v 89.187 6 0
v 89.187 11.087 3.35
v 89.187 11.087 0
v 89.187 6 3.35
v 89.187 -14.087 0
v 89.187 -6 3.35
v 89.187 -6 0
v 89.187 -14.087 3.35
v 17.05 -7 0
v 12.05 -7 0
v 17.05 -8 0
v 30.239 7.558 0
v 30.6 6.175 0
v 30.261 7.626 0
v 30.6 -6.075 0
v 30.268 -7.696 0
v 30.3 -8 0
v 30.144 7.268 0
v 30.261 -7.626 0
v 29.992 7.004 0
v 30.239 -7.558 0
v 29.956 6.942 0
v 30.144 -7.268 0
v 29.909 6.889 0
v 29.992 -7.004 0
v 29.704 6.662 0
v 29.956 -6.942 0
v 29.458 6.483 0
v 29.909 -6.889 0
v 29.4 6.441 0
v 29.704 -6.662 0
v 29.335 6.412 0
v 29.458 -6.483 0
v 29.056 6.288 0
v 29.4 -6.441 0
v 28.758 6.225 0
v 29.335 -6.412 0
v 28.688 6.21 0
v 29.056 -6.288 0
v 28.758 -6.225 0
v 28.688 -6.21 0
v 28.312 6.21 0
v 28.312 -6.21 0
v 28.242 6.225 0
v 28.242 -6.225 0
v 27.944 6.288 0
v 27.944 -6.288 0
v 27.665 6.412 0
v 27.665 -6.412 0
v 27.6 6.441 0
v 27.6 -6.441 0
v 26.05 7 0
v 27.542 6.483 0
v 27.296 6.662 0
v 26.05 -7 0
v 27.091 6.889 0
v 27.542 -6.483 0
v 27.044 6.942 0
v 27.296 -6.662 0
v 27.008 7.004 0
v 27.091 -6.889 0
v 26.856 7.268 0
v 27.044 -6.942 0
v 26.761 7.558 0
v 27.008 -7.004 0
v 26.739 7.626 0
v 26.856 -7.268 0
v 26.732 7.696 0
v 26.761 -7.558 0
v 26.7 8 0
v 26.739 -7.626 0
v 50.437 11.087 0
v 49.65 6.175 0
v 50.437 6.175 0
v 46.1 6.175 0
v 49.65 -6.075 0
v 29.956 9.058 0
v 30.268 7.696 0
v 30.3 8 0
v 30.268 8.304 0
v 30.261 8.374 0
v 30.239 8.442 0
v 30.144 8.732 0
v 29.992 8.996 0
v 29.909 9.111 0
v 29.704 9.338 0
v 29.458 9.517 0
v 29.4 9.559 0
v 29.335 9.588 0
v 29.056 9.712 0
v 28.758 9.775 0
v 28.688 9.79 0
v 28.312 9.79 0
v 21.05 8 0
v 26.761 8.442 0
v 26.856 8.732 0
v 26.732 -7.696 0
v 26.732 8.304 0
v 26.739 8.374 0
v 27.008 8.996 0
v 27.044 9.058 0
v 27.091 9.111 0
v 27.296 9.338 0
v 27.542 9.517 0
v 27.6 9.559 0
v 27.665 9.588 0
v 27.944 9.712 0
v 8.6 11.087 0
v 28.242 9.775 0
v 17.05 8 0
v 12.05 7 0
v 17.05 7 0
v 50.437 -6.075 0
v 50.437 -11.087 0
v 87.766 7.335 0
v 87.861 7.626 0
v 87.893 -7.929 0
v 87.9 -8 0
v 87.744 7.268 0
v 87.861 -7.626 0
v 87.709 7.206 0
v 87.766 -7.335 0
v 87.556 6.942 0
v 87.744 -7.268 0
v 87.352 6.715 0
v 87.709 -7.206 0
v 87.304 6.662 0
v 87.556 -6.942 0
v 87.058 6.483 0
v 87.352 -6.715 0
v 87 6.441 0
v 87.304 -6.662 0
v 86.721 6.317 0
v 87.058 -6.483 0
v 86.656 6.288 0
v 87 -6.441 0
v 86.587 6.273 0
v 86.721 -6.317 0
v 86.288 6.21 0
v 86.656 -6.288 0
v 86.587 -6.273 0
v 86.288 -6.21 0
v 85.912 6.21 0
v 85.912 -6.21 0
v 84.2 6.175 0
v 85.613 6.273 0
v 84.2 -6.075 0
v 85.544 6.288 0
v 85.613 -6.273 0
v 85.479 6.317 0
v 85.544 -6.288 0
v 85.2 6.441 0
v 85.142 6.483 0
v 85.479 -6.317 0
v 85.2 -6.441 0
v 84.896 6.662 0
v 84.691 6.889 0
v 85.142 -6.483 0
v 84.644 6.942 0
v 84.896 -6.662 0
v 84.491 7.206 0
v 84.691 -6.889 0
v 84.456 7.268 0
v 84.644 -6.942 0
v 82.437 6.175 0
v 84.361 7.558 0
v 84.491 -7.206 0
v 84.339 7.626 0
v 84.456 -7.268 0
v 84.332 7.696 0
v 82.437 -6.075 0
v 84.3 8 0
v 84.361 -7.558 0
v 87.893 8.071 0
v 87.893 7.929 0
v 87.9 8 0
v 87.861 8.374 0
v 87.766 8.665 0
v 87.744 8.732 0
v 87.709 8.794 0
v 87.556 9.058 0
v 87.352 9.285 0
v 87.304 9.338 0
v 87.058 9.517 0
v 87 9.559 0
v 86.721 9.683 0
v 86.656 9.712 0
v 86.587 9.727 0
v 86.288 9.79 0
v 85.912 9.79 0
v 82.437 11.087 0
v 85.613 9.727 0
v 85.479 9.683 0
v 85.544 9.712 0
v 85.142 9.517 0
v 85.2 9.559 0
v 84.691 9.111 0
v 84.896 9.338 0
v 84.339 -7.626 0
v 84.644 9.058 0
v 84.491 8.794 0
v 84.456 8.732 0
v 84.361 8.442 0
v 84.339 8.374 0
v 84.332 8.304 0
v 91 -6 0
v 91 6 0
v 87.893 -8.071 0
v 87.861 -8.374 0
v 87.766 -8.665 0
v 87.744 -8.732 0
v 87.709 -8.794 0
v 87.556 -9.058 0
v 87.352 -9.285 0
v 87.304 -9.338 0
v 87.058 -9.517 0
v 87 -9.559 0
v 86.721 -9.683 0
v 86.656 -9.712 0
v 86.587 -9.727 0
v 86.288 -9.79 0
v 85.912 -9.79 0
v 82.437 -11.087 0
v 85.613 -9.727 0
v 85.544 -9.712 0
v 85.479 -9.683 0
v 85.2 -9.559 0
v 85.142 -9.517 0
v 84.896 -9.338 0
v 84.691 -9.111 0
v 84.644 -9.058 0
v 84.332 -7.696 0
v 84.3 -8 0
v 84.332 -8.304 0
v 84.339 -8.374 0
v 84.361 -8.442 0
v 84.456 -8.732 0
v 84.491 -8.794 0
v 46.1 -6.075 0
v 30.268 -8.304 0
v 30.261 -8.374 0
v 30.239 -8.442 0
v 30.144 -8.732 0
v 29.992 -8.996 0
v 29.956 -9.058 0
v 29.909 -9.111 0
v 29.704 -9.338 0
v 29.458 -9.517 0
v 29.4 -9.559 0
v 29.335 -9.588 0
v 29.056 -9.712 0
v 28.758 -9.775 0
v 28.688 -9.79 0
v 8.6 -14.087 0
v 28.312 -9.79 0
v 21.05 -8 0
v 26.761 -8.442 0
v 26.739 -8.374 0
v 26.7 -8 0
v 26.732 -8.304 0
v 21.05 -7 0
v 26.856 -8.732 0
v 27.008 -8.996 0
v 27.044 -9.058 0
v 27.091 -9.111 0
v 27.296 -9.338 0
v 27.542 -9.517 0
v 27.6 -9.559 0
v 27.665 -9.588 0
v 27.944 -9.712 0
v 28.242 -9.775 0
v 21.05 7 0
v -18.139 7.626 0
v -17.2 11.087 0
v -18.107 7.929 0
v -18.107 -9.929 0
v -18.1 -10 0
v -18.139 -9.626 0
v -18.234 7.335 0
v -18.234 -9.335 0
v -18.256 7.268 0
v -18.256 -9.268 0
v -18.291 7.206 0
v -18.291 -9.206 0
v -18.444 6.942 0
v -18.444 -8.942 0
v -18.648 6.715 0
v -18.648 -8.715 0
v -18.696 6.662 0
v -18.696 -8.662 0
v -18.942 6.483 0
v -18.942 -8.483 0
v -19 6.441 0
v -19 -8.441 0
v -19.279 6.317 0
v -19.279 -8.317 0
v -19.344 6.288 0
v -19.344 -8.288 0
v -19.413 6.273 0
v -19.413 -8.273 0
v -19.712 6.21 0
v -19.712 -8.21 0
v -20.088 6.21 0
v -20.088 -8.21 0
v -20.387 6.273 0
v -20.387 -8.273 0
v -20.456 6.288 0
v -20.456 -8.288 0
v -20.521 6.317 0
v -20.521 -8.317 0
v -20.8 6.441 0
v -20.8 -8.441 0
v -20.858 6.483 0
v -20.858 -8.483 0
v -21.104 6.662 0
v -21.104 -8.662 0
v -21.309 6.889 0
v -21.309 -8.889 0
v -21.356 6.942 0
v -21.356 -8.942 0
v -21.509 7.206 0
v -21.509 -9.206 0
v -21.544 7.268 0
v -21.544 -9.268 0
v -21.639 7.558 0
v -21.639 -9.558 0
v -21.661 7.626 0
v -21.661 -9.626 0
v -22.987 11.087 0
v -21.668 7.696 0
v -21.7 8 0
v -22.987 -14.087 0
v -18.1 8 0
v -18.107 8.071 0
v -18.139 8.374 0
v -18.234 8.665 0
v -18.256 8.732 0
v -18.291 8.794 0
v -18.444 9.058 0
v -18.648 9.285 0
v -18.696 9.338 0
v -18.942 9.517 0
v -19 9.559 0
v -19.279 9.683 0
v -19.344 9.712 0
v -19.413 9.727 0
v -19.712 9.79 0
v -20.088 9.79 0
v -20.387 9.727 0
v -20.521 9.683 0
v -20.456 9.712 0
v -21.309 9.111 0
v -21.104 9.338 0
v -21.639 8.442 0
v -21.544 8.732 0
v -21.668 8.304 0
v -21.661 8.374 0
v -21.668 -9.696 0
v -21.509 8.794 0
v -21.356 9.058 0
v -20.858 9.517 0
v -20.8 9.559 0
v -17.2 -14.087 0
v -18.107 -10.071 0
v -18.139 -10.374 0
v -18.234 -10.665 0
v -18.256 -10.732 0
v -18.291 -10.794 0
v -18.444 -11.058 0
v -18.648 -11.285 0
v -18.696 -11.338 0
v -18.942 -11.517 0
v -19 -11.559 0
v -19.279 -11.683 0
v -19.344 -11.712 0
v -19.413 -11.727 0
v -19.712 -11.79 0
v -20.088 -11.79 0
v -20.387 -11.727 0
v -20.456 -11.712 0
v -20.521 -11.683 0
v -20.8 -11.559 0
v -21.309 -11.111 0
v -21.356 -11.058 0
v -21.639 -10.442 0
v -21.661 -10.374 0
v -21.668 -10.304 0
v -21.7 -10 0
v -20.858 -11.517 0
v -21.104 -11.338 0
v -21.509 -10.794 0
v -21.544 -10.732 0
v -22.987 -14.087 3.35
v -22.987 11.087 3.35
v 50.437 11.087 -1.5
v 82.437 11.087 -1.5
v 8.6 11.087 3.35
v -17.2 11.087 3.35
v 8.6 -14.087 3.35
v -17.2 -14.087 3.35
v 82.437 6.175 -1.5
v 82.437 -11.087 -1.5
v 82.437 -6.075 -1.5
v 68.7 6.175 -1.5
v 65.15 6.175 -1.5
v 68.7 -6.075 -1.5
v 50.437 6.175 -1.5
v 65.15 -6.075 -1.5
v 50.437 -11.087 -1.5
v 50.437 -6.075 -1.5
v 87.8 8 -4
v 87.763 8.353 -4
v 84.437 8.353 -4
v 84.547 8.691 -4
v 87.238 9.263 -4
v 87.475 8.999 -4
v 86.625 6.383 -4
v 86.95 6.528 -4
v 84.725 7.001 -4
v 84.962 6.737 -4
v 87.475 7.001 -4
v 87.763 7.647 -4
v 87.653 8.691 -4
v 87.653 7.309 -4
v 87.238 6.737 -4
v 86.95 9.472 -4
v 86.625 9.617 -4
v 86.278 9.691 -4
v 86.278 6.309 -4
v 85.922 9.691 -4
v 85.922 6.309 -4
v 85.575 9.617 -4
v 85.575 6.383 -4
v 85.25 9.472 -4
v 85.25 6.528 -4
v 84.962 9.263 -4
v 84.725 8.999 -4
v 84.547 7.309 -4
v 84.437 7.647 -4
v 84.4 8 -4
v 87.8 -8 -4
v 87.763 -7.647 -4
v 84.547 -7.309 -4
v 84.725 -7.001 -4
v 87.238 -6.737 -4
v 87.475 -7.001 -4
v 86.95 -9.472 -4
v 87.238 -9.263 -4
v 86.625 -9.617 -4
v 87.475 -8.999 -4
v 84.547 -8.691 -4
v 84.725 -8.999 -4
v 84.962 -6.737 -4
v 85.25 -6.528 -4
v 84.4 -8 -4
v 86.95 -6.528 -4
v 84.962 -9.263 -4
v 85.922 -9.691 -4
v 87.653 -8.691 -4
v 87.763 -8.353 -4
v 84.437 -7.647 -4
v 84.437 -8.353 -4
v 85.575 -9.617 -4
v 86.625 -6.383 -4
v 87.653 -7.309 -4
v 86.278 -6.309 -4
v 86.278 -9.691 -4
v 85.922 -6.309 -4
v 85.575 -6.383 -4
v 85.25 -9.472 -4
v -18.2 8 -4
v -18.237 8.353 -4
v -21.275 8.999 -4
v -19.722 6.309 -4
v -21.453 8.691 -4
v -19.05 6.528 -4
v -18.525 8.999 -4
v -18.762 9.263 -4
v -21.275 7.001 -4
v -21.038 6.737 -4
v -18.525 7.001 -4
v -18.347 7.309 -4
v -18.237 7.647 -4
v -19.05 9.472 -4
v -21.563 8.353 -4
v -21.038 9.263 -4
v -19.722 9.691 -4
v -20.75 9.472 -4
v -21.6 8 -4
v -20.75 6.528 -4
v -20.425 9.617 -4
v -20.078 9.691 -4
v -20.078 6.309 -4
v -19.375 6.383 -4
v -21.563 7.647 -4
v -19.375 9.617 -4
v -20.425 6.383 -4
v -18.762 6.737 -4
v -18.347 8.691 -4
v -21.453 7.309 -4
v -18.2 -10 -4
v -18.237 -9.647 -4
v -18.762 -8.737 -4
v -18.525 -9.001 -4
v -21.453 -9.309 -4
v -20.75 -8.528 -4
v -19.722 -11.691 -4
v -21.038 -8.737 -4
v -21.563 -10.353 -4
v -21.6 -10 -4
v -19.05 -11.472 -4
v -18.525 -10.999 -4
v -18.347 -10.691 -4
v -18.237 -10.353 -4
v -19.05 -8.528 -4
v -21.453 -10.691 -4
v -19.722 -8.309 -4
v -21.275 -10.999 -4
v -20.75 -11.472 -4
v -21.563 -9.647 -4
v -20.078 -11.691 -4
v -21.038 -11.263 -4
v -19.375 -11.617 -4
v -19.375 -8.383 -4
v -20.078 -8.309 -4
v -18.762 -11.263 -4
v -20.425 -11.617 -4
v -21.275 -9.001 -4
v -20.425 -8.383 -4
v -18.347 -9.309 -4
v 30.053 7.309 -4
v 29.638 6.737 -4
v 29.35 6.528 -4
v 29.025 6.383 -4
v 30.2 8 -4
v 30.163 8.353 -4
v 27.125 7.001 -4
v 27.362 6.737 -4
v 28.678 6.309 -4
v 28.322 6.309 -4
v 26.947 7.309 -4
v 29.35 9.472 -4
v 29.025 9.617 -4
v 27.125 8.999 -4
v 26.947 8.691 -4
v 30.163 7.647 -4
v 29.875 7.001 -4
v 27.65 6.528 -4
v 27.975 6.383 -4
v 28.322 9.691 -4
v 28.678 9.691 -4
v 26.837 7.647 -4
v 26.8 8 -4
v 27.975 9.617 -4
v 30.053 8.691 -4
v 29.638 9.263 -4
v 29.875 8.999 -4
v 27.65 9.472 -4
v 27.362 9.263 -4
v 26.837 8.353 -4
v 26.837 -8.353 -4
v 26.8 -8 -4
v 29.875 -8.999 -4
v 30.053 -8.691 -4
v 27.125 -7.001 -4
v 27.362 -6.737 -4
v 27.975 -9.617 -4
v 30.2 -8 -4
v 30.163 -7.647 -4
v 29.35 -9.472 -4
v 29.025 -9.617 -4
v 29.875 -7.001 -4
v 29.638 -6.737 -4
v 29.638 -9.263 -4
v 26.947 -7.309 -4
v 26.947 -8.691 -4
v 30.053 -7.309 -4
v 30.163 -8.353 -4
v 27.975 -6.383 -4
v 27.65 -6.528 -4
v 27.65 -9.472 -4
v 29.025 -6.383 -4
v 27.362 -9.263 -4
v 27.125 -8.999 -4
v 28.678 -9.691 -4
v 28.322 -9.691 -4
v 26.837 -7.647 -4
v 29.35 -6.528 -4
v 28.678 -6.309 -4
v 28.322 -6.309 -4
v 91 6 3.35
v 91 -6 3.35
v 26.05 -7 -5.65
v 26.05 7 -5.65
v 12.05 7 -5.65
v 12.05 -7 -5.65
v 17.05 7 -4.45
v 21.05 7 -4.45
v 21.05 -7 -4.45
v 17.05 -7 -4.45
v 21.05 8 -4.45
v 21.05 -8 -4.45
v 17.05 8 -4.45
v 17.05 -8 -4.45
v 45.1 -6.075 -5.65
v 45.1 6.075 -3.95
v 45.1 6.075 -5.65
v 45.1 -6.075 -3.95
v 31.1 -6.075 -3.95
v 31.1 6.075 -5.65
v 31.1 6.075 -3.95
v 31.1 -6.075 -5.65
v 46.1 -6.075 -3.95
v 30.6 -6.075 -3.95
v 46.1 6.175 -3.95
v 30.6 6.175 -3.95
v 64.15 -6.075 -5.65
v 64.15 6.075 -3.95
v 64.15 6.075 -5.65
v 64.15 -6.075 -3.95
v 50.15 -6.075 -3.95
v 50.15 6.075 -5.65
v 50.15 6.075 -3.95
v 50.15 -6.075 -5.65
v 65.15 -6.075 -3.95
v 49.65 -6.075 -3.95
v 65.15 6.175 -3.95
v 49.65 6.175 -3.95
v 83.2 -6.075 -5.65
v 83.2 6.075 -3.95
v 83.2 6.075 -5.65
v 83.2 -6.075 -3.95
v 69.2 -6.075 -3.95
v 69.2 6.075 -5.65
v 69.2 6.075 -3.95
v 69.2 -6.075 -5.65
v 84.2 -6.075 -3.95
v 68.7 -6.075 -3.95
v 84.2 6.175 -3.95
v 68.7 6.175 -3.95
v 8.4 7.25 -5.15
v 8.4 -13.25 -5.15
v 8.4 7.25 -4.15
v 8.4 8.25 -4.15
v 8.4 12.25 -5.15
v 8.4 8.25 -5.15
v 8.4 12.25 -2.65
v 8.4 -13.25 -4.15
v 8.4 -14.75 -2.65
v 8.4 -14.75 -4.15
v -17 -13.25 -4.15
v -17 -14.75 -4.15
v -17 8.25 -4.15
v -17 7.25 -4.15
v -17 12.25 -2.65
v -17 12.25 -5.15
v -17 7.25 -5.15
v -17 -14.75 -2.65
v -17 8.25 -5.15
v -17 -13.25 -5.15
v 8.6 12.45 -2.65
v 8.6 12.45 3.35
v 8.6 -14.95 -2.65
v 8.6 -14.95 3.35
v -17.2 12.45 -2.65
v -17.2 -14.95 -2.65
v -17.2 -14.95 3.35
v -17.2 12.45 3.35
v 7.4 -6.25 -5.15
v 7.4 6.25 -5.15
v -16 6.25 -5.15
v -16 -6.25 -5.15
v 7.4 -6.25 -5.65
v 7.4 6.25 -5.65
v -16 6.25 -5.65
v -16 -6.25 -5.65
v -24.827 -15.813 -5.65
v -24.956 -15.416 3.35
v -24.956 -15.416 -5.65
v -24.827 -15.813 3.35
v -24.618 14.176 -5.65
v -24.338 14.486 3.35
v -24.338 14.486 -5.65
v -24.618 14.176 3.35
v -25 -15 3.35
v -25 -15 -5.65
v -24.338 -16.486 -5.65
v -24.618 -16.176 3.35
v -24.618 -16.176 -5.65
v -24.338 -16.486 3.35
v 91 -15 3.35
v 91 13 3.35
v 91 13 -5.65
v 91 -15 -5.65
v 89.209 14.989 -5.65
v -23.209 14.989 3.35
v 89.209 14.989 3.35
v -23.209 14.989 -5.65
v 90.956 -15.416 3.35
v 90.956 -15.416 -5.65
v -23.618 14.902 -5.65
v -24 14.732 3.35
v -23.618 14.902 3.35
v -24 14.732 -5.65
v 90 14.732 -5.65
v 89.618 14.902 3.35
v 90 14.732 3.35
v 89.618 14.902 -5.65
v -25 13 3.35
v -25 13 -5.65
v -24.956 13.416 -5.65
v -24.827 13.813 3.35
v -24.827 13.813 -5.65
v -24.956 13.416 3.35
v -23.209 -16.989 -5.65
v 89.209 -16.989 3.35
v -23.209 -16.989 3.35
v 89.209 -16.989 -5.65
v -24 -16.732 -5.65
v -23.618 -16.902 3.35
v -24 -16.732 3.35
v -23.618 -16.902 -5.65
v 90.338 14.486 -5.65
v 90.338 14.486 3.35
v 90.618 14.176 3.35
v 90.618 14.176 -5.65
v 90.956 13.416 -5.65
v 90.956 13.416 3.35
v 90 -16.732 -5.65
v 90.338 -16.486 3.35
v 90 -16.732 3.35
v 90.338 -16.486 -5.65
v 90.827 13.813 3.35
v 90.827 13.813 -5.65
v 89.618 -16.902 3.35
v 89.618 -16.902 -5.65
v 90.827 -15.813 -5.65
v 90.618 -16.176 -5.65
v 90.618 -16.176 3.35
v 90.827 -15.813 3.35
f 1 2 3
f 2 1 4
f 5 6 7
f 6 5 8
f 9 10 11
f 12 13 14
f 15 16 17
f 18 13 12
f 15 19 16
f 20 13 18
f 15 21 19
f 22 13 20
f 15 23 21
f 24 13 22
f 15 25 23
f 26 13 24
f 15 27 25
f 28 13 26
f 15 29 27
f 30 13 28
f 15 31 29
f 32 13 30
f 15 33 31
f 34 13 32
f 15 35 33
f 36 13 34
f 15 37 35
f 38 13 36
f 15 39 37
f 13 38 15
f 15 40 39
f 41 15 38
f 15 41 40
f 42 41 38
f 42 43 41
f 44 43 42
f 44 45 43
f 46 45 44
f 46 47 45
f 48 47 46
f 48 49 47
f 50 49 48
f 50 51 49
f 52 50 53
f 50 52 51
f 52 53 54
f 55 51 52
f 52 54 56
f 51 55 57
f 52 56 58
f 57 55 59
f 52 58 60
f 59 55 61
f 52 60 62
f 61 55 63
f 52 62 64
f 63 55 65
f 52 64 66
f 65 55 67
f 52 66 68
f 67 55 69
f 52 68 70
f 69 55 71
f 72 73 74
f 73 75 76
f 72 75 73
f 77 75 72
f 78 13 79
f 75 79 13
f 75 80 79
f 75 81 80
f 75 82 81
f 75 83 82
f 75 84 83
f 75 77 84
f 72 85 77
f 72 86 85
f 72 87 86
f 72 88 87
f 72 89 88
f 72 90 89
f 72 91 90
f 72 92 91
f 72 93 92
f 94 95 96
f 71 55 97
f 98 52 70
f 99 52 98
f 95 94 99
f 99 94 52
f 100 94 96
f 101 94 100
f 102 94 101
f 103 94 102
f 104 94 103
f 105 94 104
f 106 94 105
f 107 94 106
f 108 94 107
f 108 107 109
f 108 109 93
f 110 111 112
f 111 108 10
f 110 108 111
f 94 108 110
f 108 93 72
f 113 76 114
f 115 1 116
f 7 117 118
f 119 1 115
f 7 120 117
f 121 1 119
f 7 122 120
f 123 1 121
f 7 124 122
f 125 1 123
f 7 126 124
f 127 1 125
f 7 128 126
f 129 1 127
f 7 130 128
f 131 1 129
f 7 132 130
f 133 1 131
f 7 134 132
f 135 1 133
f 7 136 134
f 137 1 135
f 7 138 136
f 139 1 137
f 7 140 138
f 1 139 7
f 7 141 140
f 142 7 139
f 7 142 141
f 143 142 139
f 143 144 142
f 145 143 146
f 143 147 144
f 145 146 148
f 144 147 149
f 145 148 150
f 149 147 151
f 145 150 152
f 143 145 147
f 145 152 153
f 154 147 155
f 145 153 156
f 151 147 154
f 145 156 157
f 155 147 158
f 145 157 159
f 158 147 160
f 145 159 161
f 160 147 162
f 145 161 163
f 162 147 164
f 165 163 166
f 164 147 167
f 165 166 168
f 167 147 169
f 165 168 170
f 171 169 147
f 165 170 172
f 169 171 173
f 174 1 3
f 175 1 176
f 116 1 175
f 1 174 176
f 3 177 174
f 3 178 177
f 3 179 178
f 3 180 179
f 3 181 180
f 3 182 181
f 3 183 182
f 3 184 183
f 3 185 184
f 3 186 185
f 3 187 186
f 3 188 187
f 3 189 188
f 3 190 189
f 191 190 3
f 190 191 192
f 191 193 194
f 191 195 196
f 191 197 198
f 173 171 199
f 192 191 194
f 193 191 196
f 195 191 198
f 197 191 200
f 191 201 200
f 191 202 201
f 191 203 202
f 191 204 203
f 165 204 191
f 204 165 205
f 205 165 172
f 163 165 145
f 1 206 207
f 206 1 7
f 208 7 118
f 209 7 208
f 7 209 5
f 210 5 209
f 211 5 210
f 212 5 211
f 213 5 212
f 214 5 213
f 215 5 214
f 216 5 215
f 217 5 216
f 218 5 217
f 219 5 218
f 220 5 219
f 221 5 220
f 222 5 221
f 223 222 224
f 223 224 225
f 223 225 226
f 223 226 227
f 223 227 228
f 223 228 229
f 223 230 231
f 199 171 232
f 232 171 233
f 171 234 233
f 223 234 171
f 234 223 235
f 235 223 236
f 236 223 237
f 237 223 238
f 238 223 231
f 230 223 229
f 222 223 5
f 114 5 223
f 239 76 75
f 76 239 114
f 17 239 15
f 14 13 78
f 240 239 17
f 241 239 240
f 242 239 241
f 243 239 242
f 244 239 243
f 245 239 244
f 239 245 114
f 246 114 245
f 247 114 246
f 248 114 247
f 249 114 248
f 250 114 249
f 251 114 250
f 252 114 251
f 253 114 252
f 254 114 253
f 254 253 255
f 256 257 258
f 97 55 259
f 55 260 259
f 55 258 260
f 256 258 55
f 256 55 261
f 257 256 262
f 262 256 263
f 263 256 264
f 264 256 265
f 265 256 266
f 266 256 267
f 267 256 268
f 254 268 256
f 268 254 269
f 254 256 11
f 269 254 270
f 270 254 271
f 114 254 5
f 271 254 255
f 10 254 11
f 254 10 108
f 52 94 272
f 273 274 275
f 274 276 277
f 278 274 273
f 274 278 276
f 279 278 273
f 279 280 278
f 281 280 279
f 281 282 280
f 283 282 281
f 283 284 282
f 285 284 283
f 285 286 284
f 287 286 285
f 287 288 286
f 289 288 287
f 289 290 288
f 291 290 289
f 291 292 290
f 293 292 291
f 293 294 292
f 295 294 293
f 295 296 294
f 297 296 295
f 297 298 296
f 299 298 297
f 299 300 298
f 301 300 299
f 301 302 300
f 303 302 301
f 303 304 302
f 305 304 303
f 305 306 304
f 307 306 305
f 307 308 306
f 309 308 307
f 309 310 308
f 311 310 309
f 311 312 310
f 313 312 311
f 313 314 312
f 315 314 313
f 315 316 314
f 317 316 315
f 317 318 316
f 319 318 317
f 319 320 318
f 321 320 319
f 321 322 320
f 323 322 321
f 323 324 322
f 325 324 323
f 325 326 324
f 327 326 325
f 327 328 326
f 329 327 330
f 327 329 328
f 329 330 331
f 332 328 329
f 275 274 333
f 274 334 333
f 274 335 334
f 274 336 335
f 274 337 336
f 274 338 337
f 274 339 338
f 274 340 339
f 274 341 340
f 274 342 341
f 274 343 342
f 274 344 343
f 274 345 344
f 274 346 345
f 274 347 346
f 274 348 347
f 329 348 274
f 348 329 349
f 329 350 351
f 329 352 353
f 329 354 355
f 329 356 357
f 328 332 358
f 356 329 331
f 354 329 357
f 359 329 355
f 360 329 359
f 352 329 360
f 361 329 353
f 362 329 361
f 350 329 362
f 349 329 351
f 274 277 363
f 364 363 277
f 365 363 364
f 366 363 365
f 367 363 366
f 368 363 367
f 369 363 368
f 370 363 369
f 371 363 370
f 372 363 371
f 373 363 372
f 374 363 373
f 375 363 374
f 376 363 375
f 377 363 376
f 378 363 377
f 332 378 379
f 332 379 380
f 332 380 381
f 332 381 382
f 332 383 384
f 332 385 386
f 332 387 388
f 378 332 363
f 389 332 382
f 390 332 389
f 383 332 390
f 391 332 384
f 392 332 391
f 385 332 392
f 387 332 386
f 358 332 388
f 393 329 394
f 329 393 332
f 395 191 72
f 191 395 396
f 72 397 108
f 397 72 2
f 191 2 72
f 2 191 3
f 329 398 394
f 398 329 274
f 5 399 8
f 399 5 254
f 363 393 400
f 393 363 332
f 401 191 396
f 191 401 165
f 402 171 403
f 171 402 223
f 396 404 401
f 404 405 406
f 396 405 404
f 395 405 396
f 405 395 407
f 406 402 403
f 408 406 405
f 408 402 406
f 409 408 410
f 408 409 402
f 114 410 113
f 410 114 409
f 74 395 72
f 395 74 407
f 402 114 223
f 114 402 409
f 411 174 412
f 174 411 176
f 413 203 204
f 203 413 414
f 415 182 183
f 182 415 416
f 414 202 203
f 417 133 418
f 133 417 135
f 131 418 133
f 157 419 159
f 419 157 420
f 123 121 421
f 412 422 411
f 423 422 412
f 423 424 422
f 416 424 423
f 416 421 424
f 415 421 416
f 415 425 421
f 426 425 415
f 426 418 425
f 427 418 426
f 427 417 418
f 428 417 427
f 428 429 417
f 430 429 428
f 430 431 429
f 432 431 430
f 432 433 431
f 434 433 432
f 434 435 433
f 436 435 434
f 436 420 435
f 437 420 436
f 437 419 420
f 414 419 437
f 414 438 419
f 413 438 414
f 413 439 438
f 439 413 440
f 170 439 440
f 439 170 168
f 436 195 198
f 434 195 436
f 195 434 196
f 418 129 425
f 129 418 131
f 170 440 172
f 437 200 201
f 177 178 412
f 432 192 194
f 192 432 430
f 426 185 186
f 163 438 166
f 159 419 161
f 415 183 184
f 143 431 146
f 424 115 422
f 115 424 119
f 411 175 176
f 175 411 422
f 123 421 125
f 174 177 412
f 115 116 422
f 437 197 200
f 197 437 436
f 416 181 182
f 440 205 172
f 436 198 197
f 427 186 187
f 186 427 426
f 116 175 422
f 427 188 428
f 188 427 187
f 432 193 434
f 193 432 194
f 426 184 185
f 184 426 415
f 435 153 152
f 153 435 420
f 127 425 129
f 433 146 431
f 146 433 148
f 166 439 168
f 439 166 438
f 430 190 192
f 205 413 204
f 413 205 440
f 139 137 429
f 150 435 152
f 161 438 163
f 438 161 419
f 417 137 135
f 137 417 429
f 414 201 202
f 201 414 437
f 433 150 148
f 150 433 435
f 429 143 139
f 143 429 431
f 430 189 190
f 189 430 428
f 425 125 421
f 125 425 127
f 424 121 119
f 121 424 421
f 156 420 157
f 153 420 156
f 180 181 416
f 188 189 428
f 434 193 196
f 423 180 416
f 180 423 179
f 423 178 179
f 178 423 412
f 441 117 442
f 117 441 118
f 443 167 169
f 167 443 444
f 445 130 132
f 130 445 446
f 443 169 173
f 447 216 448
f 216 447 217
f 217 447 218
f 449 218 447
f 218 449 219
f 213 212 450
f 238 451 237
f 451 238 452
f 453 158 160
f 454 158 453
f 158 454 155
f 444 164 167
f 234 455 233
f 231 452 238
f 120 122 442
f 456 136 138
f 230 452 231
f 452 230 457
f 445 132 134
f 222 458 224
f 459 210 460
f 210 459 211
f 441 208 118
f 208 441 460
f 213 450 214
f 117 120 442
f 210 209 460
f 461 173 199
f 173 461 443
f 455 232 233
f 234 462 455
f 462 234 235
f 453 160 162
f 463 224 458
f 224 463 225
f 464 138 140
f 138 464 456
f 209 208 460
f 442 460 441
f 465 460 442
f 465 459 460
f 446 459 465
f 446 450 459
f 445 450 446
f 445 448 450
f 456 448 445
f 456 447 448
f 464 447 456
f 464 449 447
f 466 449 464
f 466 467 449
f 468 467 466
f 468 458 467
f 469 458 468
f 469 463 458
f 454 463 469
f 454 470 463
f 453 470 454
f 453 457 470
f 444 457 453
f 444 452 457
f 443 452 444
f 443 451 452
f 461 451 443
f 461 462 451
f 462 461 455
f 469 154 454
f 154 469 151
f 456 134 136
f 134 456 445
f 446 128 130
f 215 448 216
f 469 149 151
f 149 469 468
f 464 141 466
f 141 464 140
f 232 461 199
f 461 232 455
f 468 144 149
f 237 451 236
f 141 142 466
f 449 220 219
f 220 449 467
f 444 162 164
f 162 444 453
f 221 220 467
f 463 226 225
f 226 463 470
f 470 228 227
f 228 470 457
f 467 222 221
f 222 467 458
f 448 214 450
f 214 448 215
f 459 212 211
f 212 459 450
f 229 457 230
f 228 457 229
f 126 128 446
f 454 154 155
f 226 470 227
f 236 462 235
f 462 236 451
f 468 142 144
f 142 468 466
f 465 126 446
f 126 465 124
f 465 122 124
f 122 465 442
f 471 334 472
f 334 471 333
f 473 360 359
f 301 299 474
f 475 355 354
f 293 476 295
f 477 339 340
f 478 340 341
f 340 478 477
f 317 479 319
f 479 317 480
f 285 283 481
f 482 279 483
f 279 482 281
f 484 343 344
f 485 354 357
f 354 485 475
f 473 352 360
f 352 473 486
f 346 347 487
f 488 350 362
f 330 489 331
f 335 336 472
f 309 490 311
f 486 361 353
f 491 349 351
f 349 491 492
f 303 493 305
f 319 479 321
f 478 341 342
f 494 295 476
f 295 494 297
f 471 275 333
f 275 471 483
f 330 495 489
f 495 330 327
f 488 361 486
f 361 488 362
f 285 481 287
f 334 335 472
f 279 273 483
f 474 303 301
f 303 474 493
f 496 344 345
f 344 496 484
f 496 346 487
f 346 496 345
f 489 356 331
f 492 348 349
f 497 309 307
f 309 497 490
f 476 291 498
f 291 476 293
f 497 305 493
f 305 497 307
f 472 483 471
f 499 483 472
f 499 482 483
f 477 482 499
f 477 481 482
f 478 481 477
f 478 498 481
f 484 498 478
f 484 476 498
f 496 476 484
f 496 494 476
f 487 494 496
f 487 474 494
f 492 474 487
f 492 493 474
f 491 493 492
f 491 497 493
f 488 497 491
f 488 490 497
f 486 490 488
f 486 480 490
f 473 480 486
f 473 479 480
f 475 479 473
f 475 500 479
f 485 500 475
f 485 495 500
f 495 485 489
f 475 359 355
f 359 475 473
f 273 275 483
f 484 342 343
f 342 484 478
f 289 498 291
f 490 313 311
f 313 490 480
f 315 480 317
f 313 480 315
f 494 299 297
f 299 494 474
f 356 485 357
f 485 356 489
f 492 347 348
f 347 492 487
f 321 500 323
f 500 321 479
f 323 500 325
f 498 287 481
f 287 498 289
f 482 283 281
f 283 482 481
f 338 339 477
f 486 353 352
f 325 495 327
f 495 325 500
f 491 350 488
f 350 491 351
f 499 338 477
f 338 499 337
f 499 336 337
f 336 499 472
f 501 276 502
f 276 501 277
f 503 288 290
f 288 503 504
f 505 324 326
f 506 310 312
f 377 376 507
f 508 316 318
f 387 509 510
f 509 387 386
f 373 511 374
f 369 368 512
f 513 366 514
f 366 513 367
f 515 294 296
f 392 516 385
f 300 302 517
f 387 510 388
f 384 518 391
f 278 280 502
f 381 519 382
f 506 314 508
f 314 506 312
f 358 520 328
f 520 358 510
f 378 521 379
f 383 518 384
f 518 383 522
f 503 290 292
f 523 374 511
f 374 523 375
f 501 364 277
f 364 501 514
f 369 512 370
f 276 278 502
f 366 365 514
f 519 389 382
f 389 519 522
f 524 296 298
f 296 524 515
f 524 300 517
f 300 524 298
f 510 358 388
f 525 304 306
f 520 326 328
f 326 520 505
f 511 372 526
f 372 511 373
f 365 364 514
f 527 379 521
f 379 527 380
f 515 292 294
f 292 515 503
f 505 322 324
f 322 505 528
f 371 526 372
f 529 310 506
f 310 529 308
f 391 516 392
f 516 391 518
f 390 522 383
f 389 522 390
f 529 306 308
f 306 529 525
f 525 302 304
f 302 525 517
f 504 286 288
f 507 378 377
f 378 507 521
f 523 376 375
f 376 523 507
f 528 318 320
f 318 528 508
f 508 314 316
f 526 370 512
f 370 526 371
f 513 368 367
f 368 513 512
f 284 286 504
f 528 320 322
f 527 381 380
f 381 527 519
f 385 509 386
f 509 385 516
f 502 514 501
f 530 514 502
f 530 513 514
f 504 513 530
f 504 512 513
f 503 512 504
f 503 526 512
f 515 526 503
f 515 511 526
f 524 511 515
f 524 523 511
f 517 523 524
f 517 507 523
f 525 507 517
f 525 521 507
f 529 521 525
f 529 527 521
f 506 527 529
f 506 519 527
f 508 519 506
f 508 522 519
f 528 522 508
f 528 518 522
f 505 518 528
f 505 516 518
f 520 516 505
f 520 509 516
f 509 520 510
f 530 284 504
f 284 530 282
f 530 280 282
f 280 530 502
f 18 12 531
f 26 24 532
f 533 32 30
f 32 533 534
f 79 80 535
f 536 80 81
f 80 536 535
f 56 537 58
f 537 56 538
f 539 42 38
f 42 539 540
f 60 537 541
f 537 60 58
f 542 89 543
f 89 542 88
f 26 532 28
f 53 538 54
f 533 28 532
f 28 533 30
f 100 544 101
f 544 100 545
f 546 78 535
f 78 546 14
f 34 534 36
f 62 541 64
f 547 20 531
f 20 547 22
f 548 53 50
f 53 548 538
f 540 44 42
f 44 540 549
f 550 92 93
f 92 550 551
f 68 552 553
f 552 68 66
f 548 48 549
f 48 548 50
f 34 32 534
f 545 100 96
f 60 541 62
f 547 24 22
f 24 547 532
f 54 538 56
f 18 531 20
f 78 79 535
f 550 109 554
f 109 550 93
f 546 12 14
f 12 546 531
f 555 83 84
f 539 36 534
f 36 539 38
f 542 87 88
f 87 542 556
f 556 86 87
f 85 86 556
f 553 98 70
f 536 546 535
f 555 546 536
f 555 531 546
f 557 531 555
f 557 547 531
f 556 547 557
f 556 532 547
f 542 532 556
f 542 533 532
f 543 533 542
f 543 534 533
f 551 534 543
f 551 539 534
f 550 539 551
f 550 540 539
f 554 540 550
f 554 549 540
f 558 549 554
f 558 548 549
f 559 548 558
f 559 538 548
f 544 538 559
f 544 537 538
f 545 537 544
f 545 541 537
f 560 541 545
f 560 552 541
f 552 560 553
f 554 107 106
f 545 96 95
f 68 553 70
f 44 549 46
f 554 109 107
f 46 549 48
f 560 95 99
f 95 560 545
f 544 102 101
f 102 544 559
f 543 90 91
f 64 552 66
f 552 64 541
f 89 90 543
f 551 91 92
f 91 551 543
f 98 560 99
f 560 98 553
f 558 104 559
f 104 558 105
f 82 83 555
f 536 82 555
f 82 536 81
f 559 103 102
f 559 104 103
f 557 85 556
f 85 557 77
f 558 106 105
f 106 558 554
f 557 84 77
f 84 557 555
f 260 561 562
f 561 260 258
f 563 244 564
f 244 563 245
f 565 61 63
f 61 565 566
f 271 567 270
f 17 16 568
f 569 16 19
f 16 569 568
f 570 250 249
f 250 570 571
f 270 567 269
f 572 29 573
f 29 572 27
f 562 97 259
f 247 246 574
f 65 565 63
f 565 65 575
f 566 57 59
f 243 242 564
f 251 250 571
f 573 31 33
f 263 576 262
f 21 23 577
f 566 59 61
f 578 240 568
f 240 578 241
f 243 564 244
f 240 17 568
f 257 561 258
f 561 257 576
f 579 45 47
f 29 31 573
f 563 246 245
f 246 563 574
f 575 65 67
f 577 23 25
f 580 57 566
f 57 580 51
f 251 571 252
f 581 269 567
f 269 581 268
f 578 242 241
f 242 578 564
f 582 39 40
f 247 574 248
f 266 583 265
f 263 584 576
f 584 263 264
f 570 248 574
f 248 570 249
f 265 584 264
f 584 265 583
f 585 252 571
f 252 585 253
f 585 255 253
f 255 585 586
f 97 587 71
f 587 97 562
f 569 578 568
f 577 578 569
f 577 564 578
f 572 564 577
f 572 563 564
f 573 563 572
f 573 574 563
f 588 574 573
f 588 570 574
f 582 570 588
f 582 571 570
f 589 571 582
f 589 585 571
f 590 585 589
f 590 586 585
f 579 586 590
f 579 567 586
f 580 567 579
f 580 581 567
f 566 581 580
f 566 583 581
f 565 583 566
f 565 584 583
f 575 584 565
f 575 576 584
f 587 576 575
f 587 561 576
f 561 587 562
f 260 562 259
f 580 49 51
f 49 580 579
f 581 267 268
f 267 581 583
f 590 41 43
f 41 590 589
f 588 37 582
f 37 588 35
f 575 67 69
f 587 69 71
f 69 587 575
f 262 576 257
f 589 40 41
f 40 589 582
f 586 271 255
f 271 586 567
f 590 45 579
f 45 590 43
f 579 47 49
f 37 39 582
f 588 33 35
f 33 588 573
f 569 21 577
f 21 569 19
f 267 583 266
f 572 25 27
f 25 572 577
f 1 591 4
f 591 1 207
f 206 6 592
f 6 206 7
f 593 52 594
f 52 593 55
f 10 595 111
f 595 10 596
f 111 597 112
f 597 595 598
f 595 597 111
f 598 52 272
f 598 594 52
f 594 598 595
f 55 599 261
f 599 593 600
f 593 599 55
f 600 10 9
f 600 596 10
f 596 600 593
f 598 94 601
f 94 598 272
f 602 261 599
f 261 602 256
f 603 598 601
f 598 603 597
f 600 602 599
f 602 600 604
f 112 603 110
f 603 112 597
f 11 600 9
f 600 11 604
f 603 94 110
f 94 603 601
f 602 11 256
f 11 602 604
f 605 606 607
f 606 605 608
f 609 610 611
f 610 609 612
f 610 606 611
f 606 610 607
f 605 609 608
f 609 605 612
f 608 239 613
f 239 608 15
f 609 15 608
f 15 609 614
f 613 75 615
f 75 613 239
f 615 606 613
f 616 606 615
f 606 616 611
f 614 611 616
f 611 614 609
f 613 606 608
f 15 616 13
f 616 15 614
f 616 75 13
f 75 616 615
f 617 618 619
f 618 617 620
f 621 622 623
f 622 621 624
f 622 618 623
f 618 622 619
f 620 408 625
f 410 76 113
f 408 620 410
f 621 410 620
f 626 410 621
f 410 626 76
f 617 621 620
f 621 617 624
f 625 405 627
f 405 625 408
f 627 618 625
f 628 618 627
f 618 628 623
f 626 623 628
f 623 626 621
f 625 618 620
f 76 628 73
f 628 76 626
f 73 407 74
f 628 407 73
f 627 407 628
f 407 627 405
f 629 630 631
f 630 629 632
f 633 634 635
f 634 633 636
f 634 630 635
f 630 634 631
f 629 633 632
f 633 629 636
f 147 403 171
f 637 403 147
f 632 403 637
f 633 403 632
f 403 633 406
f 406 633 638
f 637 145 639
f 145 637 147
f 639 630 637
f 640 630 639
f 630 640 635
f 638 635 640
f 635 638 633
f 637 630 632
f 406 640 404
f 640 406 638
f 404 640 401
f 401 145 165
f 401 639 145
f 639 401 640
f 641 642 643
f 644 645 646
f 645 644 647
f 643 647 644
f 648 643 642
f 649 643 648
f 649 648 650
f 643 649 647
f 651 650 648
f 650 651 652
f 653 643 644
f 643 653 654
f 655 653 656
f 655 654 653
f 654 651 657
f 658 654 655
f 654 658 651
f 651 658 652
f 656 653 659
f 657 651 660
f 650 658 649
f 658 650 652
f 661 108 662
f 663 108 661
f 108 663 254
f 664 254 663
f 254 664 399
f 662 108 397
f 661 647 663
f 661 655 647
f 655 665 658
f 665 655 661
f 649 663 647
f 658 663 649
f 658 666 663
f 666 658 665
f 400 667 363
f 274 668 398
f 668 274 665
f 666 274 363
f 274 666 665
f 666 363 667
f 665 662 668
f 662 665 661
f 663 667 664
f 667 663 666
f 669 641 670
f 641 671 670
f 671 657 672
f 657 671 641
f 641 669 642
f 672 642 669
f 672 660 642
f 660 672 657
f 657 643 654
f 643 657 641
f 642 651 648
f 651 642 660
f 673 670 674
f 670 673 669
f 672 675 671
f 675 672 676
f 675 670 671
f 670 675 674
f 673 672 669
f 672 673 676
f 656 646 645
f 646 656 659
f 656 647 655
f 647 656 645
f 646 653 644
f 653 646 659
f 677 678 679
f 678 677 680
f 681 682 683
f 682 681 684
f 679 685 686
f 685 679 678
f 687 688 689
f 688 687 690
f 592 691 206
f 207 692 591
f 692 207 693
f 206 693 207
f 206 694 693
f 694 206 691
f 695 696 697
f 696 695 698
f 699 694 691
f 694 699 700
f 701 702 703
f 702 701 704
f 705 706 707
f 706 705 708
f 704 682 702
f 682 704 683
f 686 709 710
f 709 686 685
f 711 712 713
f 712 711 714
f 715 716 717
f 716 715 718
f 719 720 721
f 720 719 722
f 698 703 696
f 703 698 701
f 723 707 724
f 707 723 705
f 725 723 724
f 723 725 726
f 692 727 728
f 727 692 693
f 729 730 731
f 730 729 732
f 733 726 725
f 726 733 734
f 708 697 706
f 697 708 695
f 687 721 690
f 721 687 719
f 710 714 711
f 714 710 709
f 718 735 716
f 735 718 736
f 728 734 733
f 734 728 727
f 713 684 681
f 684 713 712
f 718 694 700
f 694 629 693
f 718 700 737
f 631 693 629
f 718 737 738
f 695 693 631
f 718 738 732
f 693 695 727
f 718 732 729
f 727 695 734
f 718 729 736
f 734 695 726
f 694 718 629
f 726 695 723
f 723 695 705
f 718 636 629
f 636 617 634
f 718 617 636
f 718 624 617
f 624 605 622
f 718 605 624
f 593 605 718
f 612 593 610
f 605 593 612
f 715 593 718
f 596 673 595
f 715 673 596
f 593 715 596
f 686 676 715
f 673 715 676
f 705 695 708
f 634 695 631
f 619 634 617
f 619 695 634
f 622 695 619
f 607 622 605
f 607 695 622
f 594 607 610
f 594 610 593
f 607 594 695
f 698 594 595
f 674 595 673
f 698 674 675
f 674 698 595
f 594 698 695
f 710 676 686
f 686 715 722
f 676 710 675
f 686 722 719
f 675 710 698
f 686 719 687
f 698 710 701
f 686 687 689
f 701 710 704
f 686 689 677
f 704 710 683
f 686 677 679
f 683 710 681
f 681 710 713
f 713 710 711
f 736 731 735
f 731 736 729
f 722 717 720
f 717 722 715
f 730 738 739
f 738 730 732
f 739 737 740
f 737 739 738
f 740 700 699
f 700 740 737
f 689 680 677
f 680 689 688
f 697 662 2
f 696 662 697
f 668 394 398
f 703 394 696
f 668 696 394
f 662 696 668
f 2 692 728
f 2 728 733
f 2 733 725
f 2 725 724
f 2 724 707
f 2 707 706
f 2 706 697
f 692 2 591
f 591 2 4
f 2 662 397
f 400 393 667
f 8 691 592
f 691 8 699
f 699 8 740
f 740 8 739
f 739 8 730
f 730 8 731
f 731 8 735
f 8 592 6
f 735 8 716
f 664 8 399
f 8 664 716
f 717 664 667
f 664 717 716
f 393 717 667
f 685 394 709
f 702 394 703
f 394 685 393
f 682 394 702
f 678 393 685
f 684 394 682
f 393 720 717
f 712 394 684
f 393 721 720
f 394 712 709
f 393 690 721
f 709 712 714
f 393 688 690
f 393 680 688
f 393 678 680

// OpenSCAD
/* Notes:
 * - my M2 heat set nuts, the shortest ones, are 3.5mm in diameter and 4mm
 *   long.
 * - stock miniMACRO5 shell leaves 5mm from top face to where the PCB hits
 *   the plastic underneath. Mill-max sockets supposedly take up an additional
 *   0.64mm of space above the board.
 * - rotary encoders only need about 12.25mm in the Y.
 */

$fn=30;

// translate([0,0,-5]) import("./orig/miniMACRO5.stl");
enclosure();
// rotate([180,0,0]) translate([0,0,15-5-2]) bottomPlate();
// bottomPlate();

module enclosure() {
   difference() {
      simpleBody(ht=9); // 15 is the production value
      pcbPlus(ht=20);
      switchHoles();
      translate([-17,-14.75,-5.65]) oled12864();
   }

}

if (0) translate([70,-15,0]) difference() {
   simpleForm();
//   translate([-1,bodyWid,0]) rotate([90,0,0]) linear_extrude(height=bodyWid) polygon(points=oled128x32);
     oled12864();
}

//Thickness of entire plate
plateThickness=4.8;
//Unit square length, from Cherry MX data sheet
lkey=19.05;
//Hole size, from Cherry MX data sheet
holesize=14;
//length, in units, of board
width=15;
//Height, in units, of board
height=1;

//calculated vars

holediff=lkey-holesize;
w=width*lkey;
h=height*lkey;

//
// THINGS TO PRINT
//
module miniHoles() {
   mm5 = [
         //start ROW 0
         [[0,0],1,"x"],
         [[1,0],1,"s"],
         [[2,0],1,"r"],
         [[3,0],1,"r"],
         [[4,0],1,"r"],
         ];

   holematrix(mm5,0,h-lkey);
}


/* OLED values */
bodyWid     = 26;
bodyLen     = 25.4;
bodyDep     = 3;
windowLen   = 25;
windowOff   = 5;
windowDep   = 0.5;

epsilon     = 0.1;

   
module simpleForm(h=3.5) {
   hull() {
      translate([-2,-2,0]) cylinder(r=2,h=h);
      translate([-2,2+bodyWid,0]) cylinder(r=2,h=h);
      translate([2+bodyLen,2+bodyWid,0]) cylinder(r=2,h=h);
      translate([2+bodyLen,-2,0]) cylinder(r=2,h=h);
   }
}

module oled12864(extend=1) {
   translate([0,0,1.5]) cube([bodyLen, bodyWid, bodyDep]);
   if (extend) translate([-0.2,-0.2,3]) cube([bodyLen+0.4, bodyWid+1+0.4, 10.5]);

   translate([0,1.5,0.5]) cube([bodyLen, 20.5, bodyDep]);
   translate([1,8.5,-0.1]) cube([bodyLen-2, 12.5, bodyDep]);
   translate([0,23,0.5]) cube([bodyLen, bodyWid-22, bodyDep]);
}

module switchhole(size=1,openable=0,switch=1){
    translate([0,0,-0.1]) union(){
        if (switch) {
           cube([holesize,holesize,plateThickness+0.4+0.65]);
           translate([holesize/2-2,-1,1.3]) cube([4,holesize+2,plateThickness+0.4 - 1.3+0.65]); // for clip to catch
        }
        else /* encoder */ {
           translate([0,(holesize-12.15)/2,0]) {
              cube([holesize, 12.15, plateThickness+0.4]);
              translate([-0.5,0,1.8]) cube([holesize+1.5, 12.25, plateThickness+0.4]);
           }
        }
    }
}

module holematrix(holes,startx,starty){
    for (key = holes){
        translate([startx+lkey*key[0][0], starty-lkey*key[0][1], 0])
        translate([(lkey*key[1]-holesize)/2,(lkey - holesize)/2, 0])
        if (key[2] != "x") {
           switchhole(size=key[1],switch=(key[2] == "s" ? 1 : 0));
        }
    }
}

module bottomPlate() {
   ht = 1.5; // was 2.0
   gap = 0.2;
   postHt = 7.0;
   postDia = 5;

   difference() { 
      union() {
         translate([-12.987+gap-10,-11.087+gap-2,0])
            cube([12.987+89.187-2*gap+10,11.087*2-2*gap+2,ht]);

         translate([-12.987+gap,-11.087+gap,-1*(5-ht)])
            cube([62-gap,11.087*2-2*gap,5-ht+0.1]);

         translate([84.5,-11.087+gap,-1*(postHt-ht)])
            cube([89.187-gap-84.5,11.087*2-2*gap,postHt-ht+0.1]);

         /* posts */
         translate([-9.9,8,-1*(postHt-ht)]) cylinder(d=postDia,h=5.0);
         translate([-9.9,-8,-1*(postHt-ht)]) cylinder(d=postDia,h=5.0);
         // translate([86.1,8,-1*(postHt-ht)]) cylinder(d=postDia,h=5.0);
         // translate([86.1,-8,-1*(postHt-ht)]) cylinder(d=postDia,h=5.0);
         translate([28.5,8,-1*(postHt-ht)]) cylinder(d=postDia,h=5.0);
         translate([28.5,-8,-1*(postHt-ht)]) cylinder(d=postDia,h=5.0);
      }

      /* USB */
      translate([83,-5.5,-20.0]) cube([20,11,25.5]);

      /* reset */
      translate([-12.987+gap+20.0,11.087-5,-5+ht-0.1])
         cube([5,5,10]);
      translate([-12.987+gap+20.0+2.5,11.087-5,-5+ht-0.1])
         cylinder(d=5,h=10);
      translate([-12.987+gap+20.0-2.5,11.087-5-4,-5+ht-0.1])
         cube([10,10,3]);

      /* screw holes (make < -5.2 if needed to fill hole) */
      translate([-9.9,8,-8.3]) cylinder(d=2.25,h=8.0);
      translate([-9.9,8,0]) cylinder(d=4,h=2.1);

      translate([-9.9,-8,-8.3]) cylinder(d=2.25,h=8.0);
      translate([-9.9,-8,0]) cylinder(d=4,h=10);
      translate([86.1,8,-8.3]) cylinder(d=2.25,h=8.0);
      translate([86.1,8,0]) cylinder(d=4,h=10);
      translate([86.1,-8,-8.3]) cylinder(d=2.25,h=8.0);
      translate([86.1,-8,0]) cylinder(d=4,h=10);

      /* holes past oled */
      translate([-9.9-10,8,-8.3]) cylinder(d=2.25,h=8.0);
      translate([-9.9-10,8,0]) cylinder(d=4,h=2.1);
      translate([-9.9-10,-8-2,-8.3]) cylinder(d=2.25,h=8.0);
      translate([-9.9-10,-8-2,0]) cylinder(d=4,h=10);
   
      /* middle screw holes */
      translate([28.5,8,-8.3]) cylinder(d=2.25,h=8.0);
      translate([28.5,8,0]) cylinder(d=4,h=10);
      translate([28.5,-8,-8.3]) cylinder(d=2.25,h=8.0);
      translate([28.5,-8,0]) cylinder(d=4,h=10);

   }
}

module pcbPlus(ht=1) {
   translate([-12.987-10,-11.087-3,0]) cube([12.987+89.187+10,11.087*2+3,ht]);

   /* cutout to account for solder points for arduino riser */
   translate([89.187-35-3.75,-11.087,-1.5]) cube([32,11.087*2,ht+1.5]);

   /* screws, heat set inserts */
   translate([-9.9,8,-4]) cylinder(d2=3.65, d1=3.4,h=5);
   translate([-9.9,-8,-4]) cylinder(d2=3.65, d1=3.4,h=5);
   translate([86.1,8,-4]) cylinder(d2=3.65, d1=3.4,h=5);
   translate([86.1,-8,-4]) cylinder(d2=3.65, d1=3.4,h=5);

   /* new ones past OLED */
   translate([-9.9-10,8,-4]) cylinder(d2=3.65, d1=3.4,h=5);
   translate([-9.9-10,-8-2,-4]) cylinder(d2=3.65, d1=3.4,h=5);

   /* middle screw/heat set inserts */
   translate([28.5,8,-4]) cylinder(d2=3.65, d1=3.4,h=5);
   translate([28.5,-8,-4]) cylinder(d2=3.65, d1=3.4,h=5);

   /* USB */
   translate([80,-6,0.0]) cube([20,12,10.5]);
}

// this is the main form for the case.
module simpleBody(ht=10.5) {
   if (0) {
      /* 5.65mm accounts for mill-max sockets */
      translate([0,0,-5.65]) linear_extrude(height=ht)
         polygon(points=[[-16,-14],[-16,14],[92,14],[92,-14]]);
   }
   else {
      translate([0,0,-5.65]) linear_extrude(height=ht)
         hull() {
            translate([-23,-15,0]) circle(r=2); // changed here for OLED
            translate([-23,13,0]) circle(r=2);
            translate([89,-15,0]) circle(r=2);
            translate([89,13,0]) circle(r=2);
         }
   }
}

module switchHoles() {
   translate([-7.15-2.525+0.15,-7.15-2.525+0.15,-5.65]) miniHoles();
}
